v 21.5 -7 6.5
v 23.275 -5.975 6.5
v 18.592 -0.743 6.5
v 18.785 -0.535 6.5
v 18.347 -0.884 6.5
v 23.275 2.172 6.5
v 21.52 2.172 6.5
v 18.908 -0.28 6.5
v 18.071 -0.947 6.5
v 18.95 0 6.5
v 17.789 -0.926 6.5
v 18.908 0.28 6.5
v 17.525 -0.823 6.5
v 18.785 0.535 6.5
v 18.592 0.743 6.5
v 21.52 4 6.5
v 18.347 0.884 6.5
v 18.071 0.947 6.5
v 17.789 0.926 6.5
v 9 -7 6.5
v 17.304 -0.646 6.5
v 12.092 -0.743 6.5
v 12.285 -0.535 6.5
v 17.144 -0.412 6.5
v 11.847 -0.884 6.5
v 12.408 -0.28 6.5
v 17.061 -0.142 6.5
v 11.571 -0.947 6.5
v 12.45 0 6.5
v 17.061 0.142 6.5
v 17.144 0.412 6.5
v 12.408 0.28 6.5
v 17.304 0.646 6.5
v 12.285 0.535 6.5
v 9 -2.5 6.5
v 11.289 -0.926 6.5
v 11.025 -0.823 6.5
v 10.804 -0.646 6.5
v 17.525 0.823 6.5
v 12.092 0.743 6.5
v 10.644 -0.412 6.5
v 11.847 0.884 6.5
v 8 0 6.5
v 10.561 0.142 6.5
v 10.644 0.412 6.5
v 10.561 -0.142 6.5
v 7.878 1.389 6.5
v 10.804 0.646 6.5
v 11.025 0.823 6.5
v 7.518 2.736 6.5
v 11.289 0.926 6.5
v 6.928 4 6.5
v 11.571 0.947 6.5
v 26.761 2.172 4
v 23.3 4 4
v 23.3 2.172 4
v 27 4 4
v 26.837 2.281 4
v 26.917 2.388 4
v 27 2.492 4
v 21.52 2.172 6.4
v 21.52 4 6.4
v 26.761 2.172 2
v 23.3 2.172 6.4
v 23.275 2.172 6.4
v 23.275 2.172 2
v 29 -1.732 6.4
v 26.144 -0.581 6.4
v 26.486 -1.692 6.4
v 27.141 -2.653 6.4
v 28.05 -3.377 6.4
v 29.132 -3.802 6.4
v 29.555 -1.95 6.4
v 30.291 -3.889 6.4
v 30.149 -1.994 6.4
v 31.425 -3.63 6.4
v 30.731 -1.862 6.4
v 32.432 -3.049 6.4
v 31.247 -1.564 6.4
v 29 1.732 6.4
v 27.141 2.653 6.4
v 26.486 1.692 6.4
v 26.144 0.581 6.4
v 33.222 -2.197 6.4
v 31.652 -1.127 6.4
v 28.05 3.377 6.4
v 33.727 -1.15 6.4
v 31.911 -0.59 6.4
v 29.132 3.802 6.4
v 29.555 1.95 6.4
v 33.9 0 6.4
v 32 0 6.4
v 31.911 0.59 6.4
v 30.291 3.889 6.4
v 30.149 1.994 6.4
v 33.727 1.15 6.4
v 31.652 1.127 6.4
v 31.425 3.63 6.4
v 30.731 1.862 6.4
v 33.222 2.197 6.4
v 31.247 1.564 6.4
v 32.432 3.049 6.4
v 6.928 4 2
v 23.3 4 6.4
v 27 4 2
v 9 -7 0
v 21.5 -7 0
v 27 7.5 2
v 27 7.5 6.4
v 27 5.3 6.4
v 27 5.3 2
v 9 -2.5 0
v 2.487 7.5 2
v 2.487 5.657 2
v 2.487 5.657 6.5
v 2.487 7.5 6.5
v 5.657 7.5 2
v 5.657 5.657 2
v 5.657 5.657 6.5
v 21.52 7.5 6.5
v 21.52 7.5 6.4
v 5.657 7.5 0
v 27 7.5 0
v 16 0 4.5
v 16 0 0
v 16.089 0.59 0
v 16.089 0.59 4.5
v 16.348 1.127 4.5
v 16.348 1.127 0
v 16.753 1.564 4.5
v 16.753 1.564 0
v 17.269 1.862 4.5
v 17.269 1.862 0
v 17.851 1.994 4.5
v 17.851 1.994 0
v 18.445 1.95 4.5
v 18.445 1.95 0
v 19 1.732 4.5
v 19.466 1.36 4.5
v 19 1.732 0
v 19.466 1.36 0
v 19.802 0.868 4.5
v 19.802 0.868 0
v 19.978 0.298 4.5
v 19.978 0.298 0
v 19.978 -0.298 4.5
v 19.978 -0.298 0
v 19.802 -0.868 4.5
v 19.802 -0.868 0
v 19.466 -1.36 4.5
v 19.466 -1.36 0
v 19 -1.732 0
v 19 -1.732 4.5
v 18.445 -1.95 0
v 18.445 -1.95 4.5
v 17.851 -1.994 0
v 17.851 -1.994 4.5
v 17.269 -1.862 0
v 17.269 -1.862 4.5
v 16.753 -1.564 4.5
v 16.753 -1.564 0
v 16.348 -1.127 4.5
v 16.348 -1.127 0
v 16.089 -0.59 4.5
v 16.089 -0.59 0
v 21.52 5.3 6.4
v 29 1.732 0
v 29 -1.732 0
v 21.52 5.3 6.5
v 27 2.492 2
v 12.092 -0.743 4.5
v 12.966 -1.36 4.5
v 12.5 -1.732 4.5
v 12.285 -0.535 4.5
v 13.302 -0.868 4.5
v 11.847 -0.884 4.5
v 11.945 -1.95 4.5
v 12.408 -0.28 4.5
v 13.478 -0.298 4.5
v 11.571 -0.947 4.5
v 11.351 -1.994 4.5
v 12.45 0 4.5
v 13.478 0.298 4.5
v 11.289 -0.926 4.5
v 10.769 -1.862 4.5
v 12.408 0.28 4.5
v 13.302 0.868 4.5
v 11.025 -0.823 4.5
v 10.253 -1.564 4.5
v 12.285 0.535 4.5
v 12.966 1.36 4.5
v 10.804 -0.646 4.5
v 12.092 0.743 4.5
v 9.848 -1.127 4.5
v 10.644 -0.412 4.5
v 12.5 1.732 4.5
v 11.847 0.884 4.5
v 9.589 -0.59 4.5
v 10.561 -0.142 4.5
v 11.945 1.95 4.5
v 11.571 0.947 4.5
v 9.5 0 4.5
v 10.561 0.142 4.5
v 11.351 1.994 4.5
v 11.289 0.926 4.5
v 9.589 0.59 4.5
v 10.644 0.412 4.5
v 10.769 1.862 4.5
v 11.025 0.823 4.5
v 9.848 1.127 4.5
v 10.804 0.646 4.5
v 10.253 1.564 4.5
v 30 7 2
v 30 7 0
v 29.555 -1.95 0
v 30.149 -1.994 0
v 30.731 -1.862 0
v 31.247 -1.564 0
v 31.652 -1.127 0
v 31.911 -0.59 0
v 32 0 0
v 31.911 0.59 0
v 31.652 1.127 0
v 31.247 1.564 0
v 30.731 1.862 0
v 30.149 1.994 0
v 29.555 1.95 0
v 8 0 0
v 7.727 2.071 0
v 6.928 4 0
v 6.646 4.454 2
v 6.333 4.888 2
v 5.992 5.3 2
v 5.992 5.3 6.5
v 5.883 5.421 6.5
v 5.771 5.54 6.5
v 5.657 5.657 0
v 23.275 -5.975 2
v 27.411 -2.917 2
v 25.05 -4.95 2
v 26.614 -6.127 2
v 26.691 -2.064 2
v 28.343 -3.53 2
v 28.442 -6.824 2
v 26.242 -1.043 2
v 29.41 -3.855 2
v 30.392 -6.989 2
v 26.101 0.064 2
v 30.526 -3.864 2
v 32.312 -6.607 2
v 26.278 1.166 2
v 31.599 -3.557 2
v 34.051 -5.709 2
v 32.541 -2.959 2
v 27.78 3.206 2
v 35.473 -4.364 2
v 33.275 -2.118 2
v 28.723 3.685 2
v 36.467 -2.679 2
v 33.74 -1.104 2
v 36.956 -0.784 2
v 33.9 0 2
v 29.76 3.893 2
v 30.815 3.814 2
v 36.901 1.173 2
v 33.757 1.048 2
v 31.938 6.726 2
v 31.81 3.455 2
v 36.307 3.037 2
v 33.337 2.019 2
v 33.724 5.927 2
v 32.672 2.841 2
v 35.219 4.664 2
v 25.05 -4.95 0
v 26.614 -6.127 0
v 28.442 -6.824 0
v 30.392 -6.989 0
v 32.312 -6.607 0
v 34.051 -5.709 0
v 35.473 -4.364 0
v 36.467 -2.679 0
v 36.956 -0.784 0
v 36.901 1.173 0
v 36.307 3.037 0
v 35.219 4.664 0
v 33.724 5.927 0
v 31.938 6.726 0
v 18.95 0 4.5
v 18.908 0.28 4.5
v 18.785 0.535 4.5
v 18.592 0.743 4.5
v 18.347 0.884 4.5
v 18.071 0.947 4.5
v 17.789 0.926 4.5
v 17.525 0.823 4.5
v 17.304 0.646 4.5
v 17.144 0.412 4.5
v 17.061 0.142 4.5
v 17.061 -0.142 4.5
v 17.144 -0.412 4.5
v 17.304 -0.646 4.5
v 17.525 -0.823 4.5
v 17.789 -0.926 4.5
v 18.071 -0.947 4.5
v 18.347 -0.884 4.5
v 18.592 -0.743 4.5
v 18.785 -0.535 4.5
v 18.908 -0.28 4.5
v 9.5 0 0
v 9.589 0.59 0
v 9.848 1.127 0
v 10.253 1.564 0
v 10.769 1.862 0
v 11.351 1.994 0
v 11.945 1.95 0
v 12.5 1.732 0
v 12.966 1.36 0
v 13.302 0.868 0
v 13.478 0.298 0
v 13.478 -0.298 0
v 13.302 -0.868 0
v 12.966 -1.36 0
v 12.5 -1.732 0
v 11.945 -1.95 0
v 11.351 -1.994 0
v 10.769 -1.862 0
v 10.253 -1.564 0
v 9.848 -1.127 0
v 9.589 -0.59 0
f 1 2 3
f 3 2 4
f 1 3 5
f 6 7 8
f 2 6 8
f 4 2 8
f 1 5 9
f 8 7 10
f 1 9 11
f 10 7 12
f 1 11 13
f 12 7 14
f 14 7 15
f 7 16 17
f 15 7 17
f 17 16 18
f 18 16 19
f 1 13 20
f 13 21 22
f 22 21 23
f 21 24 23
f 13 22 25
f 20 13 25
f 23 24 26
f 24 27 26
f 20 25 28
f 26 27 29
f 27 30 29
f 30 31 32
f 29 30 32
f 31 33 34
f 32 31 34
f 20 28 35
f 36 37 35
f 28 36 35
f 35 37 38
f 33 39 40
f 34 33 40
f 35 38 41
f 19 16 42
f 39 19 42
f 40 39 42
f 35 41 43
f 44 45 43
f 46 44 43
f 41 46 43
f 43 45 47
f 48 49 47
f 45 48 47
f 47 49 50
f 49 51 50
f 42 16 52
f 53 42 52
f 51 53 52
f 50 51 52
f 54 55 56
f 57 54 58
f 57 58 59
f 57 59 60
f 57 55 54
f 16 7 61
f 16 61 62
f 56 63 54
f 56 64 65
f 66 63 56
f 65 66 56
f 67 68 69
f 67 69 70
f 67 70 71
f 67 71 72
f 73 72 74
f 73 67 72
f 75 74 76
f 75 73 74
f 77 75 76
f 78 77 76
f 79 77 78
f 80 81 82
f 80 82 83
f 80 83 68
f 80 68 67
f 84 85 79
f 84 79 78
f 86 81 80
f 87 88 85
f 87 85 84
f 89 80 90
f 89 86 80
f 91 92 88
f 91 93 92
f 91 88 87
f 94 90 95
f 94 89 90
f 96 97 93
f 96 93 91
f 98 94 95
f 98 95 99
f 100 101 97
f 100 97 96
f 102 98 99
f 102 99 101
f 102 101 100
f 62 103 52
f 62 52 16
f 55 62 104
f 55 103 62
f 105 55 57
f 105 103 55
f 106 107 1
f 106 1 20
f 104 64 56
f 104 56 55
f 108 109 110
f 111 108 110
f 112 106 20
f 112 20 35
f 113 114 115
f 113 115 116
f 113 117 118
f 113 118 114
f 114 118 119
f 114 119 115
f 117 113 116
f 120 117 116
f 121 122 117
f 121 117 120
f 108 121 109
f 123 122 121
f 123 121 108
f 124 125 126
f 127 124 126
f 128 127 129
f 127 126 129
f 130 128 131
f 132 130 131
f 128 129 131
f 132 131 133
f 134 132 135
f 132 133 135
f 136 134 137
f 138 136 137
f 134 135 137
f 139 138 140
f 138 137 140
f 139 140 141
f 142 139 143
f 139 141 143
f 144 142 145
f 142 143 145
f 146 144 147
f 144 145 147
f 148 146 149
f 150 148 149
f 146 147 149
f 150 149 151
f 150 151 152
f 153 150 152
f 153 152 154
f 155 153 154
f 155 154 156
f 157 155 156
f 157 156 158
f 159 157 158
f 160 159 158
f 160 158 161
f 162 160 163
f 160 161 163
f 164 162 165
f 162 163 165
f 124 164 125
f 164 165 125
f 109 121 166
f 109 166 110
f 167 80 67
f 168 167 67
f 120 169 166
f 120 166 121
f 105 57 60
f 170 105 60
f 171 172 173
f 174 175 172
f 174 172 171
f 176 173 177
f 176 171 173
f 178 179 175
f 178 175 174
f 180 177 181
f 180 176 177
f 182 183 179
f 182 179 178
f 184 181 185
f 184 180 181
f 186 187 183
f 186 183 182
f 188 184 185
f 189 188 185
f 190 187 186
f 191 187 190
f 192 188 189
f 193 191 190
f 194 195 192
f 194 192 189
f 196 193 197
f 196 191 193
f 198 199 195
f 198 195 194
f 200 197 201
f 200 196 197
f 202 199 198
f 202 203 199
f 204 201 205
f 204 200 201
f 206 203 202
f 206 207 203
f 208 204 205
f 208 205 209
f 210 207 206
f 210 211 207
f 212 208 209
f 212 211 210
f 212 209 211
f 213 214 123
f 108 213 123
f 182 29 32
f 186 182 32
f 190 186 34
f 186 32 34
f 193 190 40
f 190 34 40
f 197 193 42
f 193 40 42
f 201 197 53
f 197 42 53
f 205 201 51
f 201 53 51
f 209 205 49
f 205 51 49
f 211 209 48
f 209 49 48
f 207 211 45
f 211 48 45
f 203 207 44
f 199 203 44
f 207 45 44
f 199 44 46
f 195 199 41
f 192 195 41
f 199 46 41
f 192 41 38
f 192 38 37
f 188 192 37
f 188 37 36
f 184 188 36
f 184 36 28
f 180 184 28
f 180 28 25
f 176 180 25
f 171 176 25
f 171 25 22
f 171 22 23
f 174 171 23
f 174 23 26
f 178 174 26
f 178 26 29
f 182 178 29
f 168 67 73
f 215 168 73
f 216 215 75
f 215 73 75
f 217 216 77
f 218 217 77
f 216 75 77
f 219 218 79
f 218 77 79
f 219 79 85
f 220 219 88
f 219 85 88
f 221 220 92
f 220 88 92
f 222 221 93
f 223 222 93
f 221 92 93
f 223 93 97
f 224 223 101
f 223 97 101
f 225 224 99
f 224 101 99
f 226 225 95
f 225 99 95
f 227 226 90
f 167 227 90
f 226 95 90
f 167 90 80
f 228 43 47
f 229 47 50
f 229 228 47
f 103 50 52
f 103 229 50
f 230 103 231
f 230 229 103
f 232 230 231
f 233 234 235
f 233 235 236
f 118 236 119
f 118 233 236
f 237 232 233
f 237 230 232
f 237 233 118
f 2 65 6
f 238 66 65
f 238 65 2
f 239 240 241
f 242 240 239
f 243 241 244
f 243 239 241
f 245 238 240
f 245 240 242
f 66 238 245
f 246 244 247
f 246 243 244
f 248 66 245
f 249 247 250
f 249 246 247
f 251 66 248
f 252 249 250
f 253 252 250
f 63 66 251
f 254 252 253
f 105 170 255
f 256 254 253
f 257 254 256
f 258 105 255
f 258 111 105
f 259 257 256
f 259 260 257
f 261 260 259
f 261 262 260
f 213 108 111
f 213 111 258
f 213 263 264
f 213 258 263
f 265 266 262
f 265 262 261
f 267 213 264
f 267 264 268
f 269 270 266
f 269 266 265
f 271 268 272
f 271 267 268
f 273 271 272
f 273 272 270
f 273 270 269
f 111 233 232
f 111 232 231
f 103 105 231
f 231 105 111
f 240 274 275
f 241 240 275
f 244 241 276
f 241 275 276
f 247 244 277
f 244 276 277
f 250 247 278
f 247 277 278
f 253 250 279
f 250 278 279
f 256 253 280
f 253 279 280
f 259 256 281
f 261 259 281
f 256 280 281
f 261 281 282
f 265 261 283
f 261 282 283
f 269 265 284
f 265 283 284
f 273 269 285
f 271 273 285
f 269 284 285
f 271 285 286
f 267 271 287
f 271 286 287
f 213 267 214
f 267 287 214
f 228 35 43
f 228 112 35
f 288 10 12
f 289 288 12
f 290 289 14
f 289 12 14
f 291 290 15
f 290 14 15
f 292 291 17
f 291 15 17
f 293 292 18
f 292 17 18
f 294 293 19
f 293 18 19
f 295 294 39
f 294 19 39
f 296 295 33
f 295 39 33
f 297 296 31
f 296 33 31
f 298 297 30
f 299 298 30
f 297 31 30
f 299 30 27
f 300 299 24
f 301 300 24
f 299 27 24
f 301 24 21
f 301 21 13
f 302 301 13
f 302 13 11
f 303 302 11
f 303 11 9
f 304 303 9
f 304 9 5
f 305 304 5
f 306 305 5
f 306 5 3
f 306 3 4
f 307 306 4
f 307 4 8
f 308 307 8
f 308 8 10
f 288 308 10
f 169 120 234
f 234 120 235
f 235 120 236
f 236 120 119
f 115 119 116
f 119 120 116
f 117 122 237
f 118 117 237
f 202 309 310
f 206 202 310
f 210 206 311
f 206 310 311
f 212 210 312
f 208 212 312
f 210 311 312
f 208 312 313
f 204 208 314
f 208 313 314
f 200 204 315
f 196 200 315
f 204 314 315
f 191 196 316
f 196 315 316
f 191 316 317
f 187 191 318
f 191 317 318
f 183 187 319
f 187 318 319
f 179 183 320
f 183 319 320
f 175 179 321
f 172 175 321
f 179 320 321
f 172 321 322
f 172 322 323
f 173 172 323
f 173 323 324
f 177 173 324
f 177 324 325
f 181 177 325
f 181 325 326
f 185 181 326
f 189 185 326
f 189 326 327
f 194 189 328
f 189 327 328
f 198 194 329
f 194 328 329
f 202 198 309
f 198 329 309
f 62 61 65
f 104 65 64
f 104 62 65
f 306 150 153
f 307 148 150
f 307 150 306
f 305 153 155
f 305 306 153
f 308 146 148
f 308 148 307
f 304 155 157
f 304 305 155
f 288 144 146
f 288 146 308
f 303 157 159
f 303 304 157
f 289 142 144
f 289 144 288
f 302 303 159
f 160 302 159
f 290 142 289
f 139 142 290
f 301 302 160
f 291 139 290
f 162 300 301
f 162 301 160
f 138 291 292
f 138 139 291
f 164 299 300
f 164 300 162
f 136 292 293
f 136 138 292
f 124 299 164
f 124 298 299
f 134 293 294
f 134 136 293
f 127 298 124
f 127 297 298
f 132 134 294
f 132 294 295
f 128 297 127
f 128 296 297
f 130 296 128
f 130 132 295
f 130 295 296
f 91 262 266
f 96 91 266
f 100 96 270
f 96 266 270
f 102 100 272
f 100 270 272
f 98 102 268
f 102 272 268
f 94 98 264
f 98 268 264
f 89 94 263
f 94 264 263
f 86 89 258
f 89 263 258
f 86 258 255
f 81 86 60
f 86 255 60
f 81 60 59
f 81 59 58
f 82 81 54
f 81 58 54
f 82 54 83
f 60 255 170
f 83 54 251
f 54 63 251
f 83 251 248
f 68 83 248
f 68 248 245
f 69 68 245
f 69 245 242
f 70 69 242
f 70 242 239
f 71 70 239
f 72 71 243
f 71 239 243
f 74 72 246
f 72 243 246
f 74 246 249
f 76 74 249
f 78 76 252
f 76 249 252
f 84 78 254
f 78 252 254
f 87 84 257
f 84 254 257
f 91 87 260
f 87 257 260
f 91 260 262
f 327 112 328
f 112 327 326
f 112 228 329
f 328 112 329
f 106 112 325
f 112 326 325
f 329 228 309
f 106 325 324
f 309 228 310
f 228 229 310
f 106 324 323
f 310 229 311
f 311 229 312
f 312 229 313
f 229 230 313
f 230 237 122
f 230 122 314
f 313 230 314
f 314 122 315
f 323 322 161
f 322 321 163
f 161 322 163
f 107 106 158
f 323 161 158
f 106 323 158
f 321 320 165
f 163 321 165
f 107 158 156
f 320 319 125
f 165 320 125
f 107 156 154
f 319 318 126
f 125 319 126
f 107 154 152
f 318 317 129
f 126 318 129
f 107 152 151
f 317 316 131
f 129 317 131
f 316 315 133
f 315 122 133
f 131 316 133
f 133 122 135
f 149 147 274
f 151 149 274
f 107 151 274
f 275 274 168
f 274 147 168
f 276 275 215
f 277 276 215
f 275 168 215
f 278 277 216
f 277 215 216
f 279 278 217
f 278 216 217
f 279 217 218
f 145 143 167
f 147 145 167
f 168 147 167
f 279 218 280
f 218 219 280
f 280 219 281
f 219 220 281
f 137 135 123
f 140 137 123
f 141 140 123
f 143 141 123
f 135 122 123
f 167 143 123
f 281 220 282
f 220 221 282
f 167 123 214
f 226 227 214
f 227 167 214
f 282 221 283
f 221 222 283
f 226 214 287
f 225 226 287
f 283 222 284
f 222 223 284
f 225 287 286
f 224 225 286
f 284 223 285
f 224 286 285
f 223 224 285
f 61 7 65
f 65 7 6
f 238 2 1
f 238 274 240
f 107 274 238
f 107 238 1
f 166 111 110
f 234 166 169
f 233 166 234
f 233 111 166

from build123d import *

# Parameters (mm, degrees)
BOSS_EXTRUDE1_DEPTH  = 2
BOSS_EXTRUDE6_DEPTH  = 4.5
CUT_EXTRUDE6_DEPTH   = 4.5
BOSS_EXTRUDE14_DEPTH = 2.3
SKETCH32_R           = 2.1
CUT_EXTRUDE7_DEPTH   = 2.3
SKETCH33_W           = 12.5
SKETCH33_H           = 1.343145751
BOSS_EXTRUDE15_DEPTH = 1.2
SKETCH35_W           = 5.479645997
SKETCH35_H           = 5.327993755
CUT_EXTRUDE8_DEPTH   = 2.4
SKETCH36_W           = 3.7
SKETCH36_H           = 1.827993755
CUT_EXTRUDE9_DEPTH   = 2.4
SKETCH37_R           = 3.9
BOSS_EXTRUDE16_DEPTH = 4.4
CUT_EXTRUDE10_DEPTH  = 7.4
SKETCH43_R           = 2.5
BOSS_EXTRUDE17_DEPTH = 1.2
SKETCH44_R           = 0.95
CUT_EXTRUDE11_DEPTH  = 11
SKETCH45_R           = 2
CUT_EXTRUDE12_DEPTH  = 4.5
SKETCH52_R           = 0.75
CUT_EXTRUDE13_DEPTH  = 10


with BuildPart() as part:
    # Sketch3 → Boss-Extrude1 (new body)
    with BuildSketch(Plane.XY):
        with BuildLine():
            Line((8, 0), (9, -2.5))
            Line((9, -2.5), (9, -7))
            Line((9, -7), (21.5, -7))
            Line((21.5, -7), (25.050252532, -4.949747468))
            ThreePointArc((25.050252532, -4.949747468), (36.467156728, -2.678784027), (30, 7))
            Line((30, 7), (27, 7.5))
            Line((27, 7.5), (5.656854249, 7.5))
            Line((5.656854249, 7.5), (5.656854249, 5.656854249))
            ThreePointArc((5.656854249, 5.656854249), (7.39103626, 3.061467459), (8, 0))
        make_face()
    extrude(amount=BOSS_EXTRUDE1_DEPTH)

    # Sketch22 → Boss-Extrude6 (add)
    with BuildSketch(Plane.XY.offset(2)):
        with BuildLine():
            Line((5.656854249, 5.656854249), (2.486790148, 5.656854249))
            Line((2.486790148, 5.656854249), (2.486790148, 7.5))
            Line((2.486790148, 7.5), (5.656854249, 7.5))
            Line((5.656854249, 7.5), (21.5, 7.5))
            Line((21.5, 7.5), (27, 7.5))
            Line((27, 7.5), (27, 2.172006245))
            Line((27, 2.172006245), (23.275126266, 2.172006245))
            Line((23.275126266, 2.172006245), (23.275126266, -5.974873734))
            Line((23.275126266, -5.974873734), (21.5, -7))
            Line((21.5, -7), (9, -7))
            Line((9, -7), (9, -2.5))
            Line((9, -2.5), (8, 0))
            ThreePointArc((8, 0), (7.39103626, 3.061467459), (5.656854249, 5.656854249))
        make_face()
    extrude(amount=BOSS_EXTRUDE6_DEPTH)

    # Sketch26 → Cut-Extrude6 (cut)
    with BuildSketch(Plane.XY.offset(2)):
        Polygon((18.098080448, 5.3), (2.530052458, 5.3), (2.530052458, 4), (18.098080448, 4), (27, 4), (27, 5.3), align=None)
    extrude(amount=CUT_EXTRUDE6_DEPTH, mode=Mode.SUBTRACT)


with BuildPart() as body_2:
    # Sketch31 → Boss-Extrude14 (new body)
    with BuildSketch(Plane.XY.offset(6.5)):
        with BuildLine():
            Line((2.432688066, 5.656854249), (0, 5.656854249))
            ThreePointArc((0, 5.656854249), (-5.656854249, 0), (0, -5.656854249))
            Line((0, -5.656854249), (9, -5.656854249))
            Line((9, -5.656854249), (9, -7))
            Line((9, -7), (21.5, -7))
            Line((21.5, -7), (23.275126266, -5.974873734))
            Line((23.275126266, -5.974873734), (23.275126266, 2.172006245))
            Line((23.275126266, 2.172006245), (27, 2.172006245))
            Line((27, 2.172006245), (27, 7.5))
            Line((27, 7.5), (2.486790148, 7.5))
            Line((2.486790148, 7.5), (2.432688066, 5.656854249))
        make_face()
    extrude(amount=BOSS_EXTRUDE14_DEPTH)

    # Sketch32 → Cut-Extrude7 (cut)
    with BuildSketch(Plane.XY.offset(8.8)):
        Circle(SKETCH32_R)
    extrude(amount=-CUT_EXTRUDE7_DEPTH, mode=Mode.SUBTRACT)

    # Sketch33 → Boss-Extrude15 (add)
    with BuildSketch(Plane.XY.offset(8.8)):
        with Locations((15.25, -6.328427125)):
            Rectangle(SKETCH33_W, SKETCH33_H)
        Polygon((2.486790148, 7.5), (21.5, 7.5), (21.5, 5.656854249), (2.432688066, 5.656854249), align=None)
    extrude(amount=BOSS_EXTRUDE15_DEPTH)


with BuildPart() as cut_extrude8_tool:
    # Sketch35 → Cut-Extrude8 (new body)
    with BuildSketch(Plane.XY.offset(8.8)):
        with Locations((24.260177002, 4.836003123)):
            Rectangle(SKETCH35_W, SKETCH35_H)
    extrude(amount=-CUT_EXTRUDE8_DEPTH)


with BuildPart() as part_1:
    add(part.part)

    # Cut-Extrude8: cut by cut_extrude8_tool
    add(cut_extrude8_tool.part, mode=Mode.SUBTRACT)

    # Sketch36 → Cut-Extrude9 (cut)
    with BuildSketch(Plane.XY.offset(6.4)):
        with Locations((25.15, 3.086003123)):
            Rectangle(SKETCH36_W, SKETCH36_H)
    extrude(amount=-CUT_EXTRUDE9_DEPTH, mode=Mode.SUBTRACT)

    # Sketch37 → Boss-Extrude16 (add)
    with BuildSketch(Plane.XY.offset(2)):
        with Locations((30, 0)):
            Circle(SKETCH37_R)
    extrude(amount=BOSS_EXTRUDE16_DEPTH)

    # Sketch39 → Cut-Extrude10 (cut, through all)
    with BuildSketch(Plane.XY.offset(6.4)):
        with BuildLine():
            Line((29, 1.732050808), (29, -1.732050808))
            ThreePointArc((29, -1.732050808), (32, 0), (29, 1.732050808))
        make_face()
    extrude(amount=-CUT_EXTRUDE10_DEPTH, mode=Mode.SUBTRACT)


with BuildPart() as body_2_1:
    add(body_2.part)

    # Cut-Extrude8: cut by cut_extrude8_tool
    add(cut_extrude8_tool.part, mode=Mode.SUBTRACT)

    # Sketch43 → Boss-Extrude17 (add)
    with BuildSketch(Plane.XY.offset(8.8)):
        with Locations((11.5, 0)):
            Circle(SKETCH43_R)
        with Locations((18, 0)):
            Circle(SKETCH43_R)
    extrude(amount=BOSS_EXTRUDE17_DEPTH)


with BuildPart() as cut_extrude11_tool:
    # Sketch44 → Cut-Extrude11 (new body, through all)
    with BuildSketch(Plane.XY.offset(10)):
        with Locations((11.5, 0)):
            Circle(SKETCH44_R)
        with Locations((18, 0)):
            Circle(SKETCH44_R)
    extrude(amount=-CUT_EXTRUDE11_DEPTH)


with BuildPart() as part_2:
    add(part_1.part)

    # Cut-Extrude11: cut by cut_extrude11_tool
    add(cut_extrude11_tool.part, mode=Mode.SUBTRACT)

    # Sketch45 → Cut-Extrude12 (cut)
    with BuildSketch(Plane(origin=(0, 0, 0), x_dir=(-1, 0, 0), z_dir=(0, 0, -1))):
        with Locations((-11.5, 0)):
            Circle(SKETCH45_R)
        with Locations((-18, 0)):
            Circle(SKETCH45_R)
    extrude(amount=-CUT_EXTRUDE12_DEPTH, mode=Mode.SUBTRACT)


with BuildPart() as body_2_2:
    add(body_2_1.part)

    # Cut-Extrude11: cut by cut_extrude11_tool
    add(cut_extrude11_tool.part, mode=Mode.SUBTRACT)

    # Sketch52 → Cut-Extrude13 (cut, along a direction that is not the sketch's normal)
    with BuildSketch(Plane.XZ.offset(-5.656854249)):
        with Locations((18.235476819, 10)):
            Circle(SKETCH52_R)
    extrude(amount=-CUT_EXTRUDE13_DEPTH, dir=(0.640410196, -0.76803306, 0), mode=Mode.SUBTRACT)


solid = part_2.part
